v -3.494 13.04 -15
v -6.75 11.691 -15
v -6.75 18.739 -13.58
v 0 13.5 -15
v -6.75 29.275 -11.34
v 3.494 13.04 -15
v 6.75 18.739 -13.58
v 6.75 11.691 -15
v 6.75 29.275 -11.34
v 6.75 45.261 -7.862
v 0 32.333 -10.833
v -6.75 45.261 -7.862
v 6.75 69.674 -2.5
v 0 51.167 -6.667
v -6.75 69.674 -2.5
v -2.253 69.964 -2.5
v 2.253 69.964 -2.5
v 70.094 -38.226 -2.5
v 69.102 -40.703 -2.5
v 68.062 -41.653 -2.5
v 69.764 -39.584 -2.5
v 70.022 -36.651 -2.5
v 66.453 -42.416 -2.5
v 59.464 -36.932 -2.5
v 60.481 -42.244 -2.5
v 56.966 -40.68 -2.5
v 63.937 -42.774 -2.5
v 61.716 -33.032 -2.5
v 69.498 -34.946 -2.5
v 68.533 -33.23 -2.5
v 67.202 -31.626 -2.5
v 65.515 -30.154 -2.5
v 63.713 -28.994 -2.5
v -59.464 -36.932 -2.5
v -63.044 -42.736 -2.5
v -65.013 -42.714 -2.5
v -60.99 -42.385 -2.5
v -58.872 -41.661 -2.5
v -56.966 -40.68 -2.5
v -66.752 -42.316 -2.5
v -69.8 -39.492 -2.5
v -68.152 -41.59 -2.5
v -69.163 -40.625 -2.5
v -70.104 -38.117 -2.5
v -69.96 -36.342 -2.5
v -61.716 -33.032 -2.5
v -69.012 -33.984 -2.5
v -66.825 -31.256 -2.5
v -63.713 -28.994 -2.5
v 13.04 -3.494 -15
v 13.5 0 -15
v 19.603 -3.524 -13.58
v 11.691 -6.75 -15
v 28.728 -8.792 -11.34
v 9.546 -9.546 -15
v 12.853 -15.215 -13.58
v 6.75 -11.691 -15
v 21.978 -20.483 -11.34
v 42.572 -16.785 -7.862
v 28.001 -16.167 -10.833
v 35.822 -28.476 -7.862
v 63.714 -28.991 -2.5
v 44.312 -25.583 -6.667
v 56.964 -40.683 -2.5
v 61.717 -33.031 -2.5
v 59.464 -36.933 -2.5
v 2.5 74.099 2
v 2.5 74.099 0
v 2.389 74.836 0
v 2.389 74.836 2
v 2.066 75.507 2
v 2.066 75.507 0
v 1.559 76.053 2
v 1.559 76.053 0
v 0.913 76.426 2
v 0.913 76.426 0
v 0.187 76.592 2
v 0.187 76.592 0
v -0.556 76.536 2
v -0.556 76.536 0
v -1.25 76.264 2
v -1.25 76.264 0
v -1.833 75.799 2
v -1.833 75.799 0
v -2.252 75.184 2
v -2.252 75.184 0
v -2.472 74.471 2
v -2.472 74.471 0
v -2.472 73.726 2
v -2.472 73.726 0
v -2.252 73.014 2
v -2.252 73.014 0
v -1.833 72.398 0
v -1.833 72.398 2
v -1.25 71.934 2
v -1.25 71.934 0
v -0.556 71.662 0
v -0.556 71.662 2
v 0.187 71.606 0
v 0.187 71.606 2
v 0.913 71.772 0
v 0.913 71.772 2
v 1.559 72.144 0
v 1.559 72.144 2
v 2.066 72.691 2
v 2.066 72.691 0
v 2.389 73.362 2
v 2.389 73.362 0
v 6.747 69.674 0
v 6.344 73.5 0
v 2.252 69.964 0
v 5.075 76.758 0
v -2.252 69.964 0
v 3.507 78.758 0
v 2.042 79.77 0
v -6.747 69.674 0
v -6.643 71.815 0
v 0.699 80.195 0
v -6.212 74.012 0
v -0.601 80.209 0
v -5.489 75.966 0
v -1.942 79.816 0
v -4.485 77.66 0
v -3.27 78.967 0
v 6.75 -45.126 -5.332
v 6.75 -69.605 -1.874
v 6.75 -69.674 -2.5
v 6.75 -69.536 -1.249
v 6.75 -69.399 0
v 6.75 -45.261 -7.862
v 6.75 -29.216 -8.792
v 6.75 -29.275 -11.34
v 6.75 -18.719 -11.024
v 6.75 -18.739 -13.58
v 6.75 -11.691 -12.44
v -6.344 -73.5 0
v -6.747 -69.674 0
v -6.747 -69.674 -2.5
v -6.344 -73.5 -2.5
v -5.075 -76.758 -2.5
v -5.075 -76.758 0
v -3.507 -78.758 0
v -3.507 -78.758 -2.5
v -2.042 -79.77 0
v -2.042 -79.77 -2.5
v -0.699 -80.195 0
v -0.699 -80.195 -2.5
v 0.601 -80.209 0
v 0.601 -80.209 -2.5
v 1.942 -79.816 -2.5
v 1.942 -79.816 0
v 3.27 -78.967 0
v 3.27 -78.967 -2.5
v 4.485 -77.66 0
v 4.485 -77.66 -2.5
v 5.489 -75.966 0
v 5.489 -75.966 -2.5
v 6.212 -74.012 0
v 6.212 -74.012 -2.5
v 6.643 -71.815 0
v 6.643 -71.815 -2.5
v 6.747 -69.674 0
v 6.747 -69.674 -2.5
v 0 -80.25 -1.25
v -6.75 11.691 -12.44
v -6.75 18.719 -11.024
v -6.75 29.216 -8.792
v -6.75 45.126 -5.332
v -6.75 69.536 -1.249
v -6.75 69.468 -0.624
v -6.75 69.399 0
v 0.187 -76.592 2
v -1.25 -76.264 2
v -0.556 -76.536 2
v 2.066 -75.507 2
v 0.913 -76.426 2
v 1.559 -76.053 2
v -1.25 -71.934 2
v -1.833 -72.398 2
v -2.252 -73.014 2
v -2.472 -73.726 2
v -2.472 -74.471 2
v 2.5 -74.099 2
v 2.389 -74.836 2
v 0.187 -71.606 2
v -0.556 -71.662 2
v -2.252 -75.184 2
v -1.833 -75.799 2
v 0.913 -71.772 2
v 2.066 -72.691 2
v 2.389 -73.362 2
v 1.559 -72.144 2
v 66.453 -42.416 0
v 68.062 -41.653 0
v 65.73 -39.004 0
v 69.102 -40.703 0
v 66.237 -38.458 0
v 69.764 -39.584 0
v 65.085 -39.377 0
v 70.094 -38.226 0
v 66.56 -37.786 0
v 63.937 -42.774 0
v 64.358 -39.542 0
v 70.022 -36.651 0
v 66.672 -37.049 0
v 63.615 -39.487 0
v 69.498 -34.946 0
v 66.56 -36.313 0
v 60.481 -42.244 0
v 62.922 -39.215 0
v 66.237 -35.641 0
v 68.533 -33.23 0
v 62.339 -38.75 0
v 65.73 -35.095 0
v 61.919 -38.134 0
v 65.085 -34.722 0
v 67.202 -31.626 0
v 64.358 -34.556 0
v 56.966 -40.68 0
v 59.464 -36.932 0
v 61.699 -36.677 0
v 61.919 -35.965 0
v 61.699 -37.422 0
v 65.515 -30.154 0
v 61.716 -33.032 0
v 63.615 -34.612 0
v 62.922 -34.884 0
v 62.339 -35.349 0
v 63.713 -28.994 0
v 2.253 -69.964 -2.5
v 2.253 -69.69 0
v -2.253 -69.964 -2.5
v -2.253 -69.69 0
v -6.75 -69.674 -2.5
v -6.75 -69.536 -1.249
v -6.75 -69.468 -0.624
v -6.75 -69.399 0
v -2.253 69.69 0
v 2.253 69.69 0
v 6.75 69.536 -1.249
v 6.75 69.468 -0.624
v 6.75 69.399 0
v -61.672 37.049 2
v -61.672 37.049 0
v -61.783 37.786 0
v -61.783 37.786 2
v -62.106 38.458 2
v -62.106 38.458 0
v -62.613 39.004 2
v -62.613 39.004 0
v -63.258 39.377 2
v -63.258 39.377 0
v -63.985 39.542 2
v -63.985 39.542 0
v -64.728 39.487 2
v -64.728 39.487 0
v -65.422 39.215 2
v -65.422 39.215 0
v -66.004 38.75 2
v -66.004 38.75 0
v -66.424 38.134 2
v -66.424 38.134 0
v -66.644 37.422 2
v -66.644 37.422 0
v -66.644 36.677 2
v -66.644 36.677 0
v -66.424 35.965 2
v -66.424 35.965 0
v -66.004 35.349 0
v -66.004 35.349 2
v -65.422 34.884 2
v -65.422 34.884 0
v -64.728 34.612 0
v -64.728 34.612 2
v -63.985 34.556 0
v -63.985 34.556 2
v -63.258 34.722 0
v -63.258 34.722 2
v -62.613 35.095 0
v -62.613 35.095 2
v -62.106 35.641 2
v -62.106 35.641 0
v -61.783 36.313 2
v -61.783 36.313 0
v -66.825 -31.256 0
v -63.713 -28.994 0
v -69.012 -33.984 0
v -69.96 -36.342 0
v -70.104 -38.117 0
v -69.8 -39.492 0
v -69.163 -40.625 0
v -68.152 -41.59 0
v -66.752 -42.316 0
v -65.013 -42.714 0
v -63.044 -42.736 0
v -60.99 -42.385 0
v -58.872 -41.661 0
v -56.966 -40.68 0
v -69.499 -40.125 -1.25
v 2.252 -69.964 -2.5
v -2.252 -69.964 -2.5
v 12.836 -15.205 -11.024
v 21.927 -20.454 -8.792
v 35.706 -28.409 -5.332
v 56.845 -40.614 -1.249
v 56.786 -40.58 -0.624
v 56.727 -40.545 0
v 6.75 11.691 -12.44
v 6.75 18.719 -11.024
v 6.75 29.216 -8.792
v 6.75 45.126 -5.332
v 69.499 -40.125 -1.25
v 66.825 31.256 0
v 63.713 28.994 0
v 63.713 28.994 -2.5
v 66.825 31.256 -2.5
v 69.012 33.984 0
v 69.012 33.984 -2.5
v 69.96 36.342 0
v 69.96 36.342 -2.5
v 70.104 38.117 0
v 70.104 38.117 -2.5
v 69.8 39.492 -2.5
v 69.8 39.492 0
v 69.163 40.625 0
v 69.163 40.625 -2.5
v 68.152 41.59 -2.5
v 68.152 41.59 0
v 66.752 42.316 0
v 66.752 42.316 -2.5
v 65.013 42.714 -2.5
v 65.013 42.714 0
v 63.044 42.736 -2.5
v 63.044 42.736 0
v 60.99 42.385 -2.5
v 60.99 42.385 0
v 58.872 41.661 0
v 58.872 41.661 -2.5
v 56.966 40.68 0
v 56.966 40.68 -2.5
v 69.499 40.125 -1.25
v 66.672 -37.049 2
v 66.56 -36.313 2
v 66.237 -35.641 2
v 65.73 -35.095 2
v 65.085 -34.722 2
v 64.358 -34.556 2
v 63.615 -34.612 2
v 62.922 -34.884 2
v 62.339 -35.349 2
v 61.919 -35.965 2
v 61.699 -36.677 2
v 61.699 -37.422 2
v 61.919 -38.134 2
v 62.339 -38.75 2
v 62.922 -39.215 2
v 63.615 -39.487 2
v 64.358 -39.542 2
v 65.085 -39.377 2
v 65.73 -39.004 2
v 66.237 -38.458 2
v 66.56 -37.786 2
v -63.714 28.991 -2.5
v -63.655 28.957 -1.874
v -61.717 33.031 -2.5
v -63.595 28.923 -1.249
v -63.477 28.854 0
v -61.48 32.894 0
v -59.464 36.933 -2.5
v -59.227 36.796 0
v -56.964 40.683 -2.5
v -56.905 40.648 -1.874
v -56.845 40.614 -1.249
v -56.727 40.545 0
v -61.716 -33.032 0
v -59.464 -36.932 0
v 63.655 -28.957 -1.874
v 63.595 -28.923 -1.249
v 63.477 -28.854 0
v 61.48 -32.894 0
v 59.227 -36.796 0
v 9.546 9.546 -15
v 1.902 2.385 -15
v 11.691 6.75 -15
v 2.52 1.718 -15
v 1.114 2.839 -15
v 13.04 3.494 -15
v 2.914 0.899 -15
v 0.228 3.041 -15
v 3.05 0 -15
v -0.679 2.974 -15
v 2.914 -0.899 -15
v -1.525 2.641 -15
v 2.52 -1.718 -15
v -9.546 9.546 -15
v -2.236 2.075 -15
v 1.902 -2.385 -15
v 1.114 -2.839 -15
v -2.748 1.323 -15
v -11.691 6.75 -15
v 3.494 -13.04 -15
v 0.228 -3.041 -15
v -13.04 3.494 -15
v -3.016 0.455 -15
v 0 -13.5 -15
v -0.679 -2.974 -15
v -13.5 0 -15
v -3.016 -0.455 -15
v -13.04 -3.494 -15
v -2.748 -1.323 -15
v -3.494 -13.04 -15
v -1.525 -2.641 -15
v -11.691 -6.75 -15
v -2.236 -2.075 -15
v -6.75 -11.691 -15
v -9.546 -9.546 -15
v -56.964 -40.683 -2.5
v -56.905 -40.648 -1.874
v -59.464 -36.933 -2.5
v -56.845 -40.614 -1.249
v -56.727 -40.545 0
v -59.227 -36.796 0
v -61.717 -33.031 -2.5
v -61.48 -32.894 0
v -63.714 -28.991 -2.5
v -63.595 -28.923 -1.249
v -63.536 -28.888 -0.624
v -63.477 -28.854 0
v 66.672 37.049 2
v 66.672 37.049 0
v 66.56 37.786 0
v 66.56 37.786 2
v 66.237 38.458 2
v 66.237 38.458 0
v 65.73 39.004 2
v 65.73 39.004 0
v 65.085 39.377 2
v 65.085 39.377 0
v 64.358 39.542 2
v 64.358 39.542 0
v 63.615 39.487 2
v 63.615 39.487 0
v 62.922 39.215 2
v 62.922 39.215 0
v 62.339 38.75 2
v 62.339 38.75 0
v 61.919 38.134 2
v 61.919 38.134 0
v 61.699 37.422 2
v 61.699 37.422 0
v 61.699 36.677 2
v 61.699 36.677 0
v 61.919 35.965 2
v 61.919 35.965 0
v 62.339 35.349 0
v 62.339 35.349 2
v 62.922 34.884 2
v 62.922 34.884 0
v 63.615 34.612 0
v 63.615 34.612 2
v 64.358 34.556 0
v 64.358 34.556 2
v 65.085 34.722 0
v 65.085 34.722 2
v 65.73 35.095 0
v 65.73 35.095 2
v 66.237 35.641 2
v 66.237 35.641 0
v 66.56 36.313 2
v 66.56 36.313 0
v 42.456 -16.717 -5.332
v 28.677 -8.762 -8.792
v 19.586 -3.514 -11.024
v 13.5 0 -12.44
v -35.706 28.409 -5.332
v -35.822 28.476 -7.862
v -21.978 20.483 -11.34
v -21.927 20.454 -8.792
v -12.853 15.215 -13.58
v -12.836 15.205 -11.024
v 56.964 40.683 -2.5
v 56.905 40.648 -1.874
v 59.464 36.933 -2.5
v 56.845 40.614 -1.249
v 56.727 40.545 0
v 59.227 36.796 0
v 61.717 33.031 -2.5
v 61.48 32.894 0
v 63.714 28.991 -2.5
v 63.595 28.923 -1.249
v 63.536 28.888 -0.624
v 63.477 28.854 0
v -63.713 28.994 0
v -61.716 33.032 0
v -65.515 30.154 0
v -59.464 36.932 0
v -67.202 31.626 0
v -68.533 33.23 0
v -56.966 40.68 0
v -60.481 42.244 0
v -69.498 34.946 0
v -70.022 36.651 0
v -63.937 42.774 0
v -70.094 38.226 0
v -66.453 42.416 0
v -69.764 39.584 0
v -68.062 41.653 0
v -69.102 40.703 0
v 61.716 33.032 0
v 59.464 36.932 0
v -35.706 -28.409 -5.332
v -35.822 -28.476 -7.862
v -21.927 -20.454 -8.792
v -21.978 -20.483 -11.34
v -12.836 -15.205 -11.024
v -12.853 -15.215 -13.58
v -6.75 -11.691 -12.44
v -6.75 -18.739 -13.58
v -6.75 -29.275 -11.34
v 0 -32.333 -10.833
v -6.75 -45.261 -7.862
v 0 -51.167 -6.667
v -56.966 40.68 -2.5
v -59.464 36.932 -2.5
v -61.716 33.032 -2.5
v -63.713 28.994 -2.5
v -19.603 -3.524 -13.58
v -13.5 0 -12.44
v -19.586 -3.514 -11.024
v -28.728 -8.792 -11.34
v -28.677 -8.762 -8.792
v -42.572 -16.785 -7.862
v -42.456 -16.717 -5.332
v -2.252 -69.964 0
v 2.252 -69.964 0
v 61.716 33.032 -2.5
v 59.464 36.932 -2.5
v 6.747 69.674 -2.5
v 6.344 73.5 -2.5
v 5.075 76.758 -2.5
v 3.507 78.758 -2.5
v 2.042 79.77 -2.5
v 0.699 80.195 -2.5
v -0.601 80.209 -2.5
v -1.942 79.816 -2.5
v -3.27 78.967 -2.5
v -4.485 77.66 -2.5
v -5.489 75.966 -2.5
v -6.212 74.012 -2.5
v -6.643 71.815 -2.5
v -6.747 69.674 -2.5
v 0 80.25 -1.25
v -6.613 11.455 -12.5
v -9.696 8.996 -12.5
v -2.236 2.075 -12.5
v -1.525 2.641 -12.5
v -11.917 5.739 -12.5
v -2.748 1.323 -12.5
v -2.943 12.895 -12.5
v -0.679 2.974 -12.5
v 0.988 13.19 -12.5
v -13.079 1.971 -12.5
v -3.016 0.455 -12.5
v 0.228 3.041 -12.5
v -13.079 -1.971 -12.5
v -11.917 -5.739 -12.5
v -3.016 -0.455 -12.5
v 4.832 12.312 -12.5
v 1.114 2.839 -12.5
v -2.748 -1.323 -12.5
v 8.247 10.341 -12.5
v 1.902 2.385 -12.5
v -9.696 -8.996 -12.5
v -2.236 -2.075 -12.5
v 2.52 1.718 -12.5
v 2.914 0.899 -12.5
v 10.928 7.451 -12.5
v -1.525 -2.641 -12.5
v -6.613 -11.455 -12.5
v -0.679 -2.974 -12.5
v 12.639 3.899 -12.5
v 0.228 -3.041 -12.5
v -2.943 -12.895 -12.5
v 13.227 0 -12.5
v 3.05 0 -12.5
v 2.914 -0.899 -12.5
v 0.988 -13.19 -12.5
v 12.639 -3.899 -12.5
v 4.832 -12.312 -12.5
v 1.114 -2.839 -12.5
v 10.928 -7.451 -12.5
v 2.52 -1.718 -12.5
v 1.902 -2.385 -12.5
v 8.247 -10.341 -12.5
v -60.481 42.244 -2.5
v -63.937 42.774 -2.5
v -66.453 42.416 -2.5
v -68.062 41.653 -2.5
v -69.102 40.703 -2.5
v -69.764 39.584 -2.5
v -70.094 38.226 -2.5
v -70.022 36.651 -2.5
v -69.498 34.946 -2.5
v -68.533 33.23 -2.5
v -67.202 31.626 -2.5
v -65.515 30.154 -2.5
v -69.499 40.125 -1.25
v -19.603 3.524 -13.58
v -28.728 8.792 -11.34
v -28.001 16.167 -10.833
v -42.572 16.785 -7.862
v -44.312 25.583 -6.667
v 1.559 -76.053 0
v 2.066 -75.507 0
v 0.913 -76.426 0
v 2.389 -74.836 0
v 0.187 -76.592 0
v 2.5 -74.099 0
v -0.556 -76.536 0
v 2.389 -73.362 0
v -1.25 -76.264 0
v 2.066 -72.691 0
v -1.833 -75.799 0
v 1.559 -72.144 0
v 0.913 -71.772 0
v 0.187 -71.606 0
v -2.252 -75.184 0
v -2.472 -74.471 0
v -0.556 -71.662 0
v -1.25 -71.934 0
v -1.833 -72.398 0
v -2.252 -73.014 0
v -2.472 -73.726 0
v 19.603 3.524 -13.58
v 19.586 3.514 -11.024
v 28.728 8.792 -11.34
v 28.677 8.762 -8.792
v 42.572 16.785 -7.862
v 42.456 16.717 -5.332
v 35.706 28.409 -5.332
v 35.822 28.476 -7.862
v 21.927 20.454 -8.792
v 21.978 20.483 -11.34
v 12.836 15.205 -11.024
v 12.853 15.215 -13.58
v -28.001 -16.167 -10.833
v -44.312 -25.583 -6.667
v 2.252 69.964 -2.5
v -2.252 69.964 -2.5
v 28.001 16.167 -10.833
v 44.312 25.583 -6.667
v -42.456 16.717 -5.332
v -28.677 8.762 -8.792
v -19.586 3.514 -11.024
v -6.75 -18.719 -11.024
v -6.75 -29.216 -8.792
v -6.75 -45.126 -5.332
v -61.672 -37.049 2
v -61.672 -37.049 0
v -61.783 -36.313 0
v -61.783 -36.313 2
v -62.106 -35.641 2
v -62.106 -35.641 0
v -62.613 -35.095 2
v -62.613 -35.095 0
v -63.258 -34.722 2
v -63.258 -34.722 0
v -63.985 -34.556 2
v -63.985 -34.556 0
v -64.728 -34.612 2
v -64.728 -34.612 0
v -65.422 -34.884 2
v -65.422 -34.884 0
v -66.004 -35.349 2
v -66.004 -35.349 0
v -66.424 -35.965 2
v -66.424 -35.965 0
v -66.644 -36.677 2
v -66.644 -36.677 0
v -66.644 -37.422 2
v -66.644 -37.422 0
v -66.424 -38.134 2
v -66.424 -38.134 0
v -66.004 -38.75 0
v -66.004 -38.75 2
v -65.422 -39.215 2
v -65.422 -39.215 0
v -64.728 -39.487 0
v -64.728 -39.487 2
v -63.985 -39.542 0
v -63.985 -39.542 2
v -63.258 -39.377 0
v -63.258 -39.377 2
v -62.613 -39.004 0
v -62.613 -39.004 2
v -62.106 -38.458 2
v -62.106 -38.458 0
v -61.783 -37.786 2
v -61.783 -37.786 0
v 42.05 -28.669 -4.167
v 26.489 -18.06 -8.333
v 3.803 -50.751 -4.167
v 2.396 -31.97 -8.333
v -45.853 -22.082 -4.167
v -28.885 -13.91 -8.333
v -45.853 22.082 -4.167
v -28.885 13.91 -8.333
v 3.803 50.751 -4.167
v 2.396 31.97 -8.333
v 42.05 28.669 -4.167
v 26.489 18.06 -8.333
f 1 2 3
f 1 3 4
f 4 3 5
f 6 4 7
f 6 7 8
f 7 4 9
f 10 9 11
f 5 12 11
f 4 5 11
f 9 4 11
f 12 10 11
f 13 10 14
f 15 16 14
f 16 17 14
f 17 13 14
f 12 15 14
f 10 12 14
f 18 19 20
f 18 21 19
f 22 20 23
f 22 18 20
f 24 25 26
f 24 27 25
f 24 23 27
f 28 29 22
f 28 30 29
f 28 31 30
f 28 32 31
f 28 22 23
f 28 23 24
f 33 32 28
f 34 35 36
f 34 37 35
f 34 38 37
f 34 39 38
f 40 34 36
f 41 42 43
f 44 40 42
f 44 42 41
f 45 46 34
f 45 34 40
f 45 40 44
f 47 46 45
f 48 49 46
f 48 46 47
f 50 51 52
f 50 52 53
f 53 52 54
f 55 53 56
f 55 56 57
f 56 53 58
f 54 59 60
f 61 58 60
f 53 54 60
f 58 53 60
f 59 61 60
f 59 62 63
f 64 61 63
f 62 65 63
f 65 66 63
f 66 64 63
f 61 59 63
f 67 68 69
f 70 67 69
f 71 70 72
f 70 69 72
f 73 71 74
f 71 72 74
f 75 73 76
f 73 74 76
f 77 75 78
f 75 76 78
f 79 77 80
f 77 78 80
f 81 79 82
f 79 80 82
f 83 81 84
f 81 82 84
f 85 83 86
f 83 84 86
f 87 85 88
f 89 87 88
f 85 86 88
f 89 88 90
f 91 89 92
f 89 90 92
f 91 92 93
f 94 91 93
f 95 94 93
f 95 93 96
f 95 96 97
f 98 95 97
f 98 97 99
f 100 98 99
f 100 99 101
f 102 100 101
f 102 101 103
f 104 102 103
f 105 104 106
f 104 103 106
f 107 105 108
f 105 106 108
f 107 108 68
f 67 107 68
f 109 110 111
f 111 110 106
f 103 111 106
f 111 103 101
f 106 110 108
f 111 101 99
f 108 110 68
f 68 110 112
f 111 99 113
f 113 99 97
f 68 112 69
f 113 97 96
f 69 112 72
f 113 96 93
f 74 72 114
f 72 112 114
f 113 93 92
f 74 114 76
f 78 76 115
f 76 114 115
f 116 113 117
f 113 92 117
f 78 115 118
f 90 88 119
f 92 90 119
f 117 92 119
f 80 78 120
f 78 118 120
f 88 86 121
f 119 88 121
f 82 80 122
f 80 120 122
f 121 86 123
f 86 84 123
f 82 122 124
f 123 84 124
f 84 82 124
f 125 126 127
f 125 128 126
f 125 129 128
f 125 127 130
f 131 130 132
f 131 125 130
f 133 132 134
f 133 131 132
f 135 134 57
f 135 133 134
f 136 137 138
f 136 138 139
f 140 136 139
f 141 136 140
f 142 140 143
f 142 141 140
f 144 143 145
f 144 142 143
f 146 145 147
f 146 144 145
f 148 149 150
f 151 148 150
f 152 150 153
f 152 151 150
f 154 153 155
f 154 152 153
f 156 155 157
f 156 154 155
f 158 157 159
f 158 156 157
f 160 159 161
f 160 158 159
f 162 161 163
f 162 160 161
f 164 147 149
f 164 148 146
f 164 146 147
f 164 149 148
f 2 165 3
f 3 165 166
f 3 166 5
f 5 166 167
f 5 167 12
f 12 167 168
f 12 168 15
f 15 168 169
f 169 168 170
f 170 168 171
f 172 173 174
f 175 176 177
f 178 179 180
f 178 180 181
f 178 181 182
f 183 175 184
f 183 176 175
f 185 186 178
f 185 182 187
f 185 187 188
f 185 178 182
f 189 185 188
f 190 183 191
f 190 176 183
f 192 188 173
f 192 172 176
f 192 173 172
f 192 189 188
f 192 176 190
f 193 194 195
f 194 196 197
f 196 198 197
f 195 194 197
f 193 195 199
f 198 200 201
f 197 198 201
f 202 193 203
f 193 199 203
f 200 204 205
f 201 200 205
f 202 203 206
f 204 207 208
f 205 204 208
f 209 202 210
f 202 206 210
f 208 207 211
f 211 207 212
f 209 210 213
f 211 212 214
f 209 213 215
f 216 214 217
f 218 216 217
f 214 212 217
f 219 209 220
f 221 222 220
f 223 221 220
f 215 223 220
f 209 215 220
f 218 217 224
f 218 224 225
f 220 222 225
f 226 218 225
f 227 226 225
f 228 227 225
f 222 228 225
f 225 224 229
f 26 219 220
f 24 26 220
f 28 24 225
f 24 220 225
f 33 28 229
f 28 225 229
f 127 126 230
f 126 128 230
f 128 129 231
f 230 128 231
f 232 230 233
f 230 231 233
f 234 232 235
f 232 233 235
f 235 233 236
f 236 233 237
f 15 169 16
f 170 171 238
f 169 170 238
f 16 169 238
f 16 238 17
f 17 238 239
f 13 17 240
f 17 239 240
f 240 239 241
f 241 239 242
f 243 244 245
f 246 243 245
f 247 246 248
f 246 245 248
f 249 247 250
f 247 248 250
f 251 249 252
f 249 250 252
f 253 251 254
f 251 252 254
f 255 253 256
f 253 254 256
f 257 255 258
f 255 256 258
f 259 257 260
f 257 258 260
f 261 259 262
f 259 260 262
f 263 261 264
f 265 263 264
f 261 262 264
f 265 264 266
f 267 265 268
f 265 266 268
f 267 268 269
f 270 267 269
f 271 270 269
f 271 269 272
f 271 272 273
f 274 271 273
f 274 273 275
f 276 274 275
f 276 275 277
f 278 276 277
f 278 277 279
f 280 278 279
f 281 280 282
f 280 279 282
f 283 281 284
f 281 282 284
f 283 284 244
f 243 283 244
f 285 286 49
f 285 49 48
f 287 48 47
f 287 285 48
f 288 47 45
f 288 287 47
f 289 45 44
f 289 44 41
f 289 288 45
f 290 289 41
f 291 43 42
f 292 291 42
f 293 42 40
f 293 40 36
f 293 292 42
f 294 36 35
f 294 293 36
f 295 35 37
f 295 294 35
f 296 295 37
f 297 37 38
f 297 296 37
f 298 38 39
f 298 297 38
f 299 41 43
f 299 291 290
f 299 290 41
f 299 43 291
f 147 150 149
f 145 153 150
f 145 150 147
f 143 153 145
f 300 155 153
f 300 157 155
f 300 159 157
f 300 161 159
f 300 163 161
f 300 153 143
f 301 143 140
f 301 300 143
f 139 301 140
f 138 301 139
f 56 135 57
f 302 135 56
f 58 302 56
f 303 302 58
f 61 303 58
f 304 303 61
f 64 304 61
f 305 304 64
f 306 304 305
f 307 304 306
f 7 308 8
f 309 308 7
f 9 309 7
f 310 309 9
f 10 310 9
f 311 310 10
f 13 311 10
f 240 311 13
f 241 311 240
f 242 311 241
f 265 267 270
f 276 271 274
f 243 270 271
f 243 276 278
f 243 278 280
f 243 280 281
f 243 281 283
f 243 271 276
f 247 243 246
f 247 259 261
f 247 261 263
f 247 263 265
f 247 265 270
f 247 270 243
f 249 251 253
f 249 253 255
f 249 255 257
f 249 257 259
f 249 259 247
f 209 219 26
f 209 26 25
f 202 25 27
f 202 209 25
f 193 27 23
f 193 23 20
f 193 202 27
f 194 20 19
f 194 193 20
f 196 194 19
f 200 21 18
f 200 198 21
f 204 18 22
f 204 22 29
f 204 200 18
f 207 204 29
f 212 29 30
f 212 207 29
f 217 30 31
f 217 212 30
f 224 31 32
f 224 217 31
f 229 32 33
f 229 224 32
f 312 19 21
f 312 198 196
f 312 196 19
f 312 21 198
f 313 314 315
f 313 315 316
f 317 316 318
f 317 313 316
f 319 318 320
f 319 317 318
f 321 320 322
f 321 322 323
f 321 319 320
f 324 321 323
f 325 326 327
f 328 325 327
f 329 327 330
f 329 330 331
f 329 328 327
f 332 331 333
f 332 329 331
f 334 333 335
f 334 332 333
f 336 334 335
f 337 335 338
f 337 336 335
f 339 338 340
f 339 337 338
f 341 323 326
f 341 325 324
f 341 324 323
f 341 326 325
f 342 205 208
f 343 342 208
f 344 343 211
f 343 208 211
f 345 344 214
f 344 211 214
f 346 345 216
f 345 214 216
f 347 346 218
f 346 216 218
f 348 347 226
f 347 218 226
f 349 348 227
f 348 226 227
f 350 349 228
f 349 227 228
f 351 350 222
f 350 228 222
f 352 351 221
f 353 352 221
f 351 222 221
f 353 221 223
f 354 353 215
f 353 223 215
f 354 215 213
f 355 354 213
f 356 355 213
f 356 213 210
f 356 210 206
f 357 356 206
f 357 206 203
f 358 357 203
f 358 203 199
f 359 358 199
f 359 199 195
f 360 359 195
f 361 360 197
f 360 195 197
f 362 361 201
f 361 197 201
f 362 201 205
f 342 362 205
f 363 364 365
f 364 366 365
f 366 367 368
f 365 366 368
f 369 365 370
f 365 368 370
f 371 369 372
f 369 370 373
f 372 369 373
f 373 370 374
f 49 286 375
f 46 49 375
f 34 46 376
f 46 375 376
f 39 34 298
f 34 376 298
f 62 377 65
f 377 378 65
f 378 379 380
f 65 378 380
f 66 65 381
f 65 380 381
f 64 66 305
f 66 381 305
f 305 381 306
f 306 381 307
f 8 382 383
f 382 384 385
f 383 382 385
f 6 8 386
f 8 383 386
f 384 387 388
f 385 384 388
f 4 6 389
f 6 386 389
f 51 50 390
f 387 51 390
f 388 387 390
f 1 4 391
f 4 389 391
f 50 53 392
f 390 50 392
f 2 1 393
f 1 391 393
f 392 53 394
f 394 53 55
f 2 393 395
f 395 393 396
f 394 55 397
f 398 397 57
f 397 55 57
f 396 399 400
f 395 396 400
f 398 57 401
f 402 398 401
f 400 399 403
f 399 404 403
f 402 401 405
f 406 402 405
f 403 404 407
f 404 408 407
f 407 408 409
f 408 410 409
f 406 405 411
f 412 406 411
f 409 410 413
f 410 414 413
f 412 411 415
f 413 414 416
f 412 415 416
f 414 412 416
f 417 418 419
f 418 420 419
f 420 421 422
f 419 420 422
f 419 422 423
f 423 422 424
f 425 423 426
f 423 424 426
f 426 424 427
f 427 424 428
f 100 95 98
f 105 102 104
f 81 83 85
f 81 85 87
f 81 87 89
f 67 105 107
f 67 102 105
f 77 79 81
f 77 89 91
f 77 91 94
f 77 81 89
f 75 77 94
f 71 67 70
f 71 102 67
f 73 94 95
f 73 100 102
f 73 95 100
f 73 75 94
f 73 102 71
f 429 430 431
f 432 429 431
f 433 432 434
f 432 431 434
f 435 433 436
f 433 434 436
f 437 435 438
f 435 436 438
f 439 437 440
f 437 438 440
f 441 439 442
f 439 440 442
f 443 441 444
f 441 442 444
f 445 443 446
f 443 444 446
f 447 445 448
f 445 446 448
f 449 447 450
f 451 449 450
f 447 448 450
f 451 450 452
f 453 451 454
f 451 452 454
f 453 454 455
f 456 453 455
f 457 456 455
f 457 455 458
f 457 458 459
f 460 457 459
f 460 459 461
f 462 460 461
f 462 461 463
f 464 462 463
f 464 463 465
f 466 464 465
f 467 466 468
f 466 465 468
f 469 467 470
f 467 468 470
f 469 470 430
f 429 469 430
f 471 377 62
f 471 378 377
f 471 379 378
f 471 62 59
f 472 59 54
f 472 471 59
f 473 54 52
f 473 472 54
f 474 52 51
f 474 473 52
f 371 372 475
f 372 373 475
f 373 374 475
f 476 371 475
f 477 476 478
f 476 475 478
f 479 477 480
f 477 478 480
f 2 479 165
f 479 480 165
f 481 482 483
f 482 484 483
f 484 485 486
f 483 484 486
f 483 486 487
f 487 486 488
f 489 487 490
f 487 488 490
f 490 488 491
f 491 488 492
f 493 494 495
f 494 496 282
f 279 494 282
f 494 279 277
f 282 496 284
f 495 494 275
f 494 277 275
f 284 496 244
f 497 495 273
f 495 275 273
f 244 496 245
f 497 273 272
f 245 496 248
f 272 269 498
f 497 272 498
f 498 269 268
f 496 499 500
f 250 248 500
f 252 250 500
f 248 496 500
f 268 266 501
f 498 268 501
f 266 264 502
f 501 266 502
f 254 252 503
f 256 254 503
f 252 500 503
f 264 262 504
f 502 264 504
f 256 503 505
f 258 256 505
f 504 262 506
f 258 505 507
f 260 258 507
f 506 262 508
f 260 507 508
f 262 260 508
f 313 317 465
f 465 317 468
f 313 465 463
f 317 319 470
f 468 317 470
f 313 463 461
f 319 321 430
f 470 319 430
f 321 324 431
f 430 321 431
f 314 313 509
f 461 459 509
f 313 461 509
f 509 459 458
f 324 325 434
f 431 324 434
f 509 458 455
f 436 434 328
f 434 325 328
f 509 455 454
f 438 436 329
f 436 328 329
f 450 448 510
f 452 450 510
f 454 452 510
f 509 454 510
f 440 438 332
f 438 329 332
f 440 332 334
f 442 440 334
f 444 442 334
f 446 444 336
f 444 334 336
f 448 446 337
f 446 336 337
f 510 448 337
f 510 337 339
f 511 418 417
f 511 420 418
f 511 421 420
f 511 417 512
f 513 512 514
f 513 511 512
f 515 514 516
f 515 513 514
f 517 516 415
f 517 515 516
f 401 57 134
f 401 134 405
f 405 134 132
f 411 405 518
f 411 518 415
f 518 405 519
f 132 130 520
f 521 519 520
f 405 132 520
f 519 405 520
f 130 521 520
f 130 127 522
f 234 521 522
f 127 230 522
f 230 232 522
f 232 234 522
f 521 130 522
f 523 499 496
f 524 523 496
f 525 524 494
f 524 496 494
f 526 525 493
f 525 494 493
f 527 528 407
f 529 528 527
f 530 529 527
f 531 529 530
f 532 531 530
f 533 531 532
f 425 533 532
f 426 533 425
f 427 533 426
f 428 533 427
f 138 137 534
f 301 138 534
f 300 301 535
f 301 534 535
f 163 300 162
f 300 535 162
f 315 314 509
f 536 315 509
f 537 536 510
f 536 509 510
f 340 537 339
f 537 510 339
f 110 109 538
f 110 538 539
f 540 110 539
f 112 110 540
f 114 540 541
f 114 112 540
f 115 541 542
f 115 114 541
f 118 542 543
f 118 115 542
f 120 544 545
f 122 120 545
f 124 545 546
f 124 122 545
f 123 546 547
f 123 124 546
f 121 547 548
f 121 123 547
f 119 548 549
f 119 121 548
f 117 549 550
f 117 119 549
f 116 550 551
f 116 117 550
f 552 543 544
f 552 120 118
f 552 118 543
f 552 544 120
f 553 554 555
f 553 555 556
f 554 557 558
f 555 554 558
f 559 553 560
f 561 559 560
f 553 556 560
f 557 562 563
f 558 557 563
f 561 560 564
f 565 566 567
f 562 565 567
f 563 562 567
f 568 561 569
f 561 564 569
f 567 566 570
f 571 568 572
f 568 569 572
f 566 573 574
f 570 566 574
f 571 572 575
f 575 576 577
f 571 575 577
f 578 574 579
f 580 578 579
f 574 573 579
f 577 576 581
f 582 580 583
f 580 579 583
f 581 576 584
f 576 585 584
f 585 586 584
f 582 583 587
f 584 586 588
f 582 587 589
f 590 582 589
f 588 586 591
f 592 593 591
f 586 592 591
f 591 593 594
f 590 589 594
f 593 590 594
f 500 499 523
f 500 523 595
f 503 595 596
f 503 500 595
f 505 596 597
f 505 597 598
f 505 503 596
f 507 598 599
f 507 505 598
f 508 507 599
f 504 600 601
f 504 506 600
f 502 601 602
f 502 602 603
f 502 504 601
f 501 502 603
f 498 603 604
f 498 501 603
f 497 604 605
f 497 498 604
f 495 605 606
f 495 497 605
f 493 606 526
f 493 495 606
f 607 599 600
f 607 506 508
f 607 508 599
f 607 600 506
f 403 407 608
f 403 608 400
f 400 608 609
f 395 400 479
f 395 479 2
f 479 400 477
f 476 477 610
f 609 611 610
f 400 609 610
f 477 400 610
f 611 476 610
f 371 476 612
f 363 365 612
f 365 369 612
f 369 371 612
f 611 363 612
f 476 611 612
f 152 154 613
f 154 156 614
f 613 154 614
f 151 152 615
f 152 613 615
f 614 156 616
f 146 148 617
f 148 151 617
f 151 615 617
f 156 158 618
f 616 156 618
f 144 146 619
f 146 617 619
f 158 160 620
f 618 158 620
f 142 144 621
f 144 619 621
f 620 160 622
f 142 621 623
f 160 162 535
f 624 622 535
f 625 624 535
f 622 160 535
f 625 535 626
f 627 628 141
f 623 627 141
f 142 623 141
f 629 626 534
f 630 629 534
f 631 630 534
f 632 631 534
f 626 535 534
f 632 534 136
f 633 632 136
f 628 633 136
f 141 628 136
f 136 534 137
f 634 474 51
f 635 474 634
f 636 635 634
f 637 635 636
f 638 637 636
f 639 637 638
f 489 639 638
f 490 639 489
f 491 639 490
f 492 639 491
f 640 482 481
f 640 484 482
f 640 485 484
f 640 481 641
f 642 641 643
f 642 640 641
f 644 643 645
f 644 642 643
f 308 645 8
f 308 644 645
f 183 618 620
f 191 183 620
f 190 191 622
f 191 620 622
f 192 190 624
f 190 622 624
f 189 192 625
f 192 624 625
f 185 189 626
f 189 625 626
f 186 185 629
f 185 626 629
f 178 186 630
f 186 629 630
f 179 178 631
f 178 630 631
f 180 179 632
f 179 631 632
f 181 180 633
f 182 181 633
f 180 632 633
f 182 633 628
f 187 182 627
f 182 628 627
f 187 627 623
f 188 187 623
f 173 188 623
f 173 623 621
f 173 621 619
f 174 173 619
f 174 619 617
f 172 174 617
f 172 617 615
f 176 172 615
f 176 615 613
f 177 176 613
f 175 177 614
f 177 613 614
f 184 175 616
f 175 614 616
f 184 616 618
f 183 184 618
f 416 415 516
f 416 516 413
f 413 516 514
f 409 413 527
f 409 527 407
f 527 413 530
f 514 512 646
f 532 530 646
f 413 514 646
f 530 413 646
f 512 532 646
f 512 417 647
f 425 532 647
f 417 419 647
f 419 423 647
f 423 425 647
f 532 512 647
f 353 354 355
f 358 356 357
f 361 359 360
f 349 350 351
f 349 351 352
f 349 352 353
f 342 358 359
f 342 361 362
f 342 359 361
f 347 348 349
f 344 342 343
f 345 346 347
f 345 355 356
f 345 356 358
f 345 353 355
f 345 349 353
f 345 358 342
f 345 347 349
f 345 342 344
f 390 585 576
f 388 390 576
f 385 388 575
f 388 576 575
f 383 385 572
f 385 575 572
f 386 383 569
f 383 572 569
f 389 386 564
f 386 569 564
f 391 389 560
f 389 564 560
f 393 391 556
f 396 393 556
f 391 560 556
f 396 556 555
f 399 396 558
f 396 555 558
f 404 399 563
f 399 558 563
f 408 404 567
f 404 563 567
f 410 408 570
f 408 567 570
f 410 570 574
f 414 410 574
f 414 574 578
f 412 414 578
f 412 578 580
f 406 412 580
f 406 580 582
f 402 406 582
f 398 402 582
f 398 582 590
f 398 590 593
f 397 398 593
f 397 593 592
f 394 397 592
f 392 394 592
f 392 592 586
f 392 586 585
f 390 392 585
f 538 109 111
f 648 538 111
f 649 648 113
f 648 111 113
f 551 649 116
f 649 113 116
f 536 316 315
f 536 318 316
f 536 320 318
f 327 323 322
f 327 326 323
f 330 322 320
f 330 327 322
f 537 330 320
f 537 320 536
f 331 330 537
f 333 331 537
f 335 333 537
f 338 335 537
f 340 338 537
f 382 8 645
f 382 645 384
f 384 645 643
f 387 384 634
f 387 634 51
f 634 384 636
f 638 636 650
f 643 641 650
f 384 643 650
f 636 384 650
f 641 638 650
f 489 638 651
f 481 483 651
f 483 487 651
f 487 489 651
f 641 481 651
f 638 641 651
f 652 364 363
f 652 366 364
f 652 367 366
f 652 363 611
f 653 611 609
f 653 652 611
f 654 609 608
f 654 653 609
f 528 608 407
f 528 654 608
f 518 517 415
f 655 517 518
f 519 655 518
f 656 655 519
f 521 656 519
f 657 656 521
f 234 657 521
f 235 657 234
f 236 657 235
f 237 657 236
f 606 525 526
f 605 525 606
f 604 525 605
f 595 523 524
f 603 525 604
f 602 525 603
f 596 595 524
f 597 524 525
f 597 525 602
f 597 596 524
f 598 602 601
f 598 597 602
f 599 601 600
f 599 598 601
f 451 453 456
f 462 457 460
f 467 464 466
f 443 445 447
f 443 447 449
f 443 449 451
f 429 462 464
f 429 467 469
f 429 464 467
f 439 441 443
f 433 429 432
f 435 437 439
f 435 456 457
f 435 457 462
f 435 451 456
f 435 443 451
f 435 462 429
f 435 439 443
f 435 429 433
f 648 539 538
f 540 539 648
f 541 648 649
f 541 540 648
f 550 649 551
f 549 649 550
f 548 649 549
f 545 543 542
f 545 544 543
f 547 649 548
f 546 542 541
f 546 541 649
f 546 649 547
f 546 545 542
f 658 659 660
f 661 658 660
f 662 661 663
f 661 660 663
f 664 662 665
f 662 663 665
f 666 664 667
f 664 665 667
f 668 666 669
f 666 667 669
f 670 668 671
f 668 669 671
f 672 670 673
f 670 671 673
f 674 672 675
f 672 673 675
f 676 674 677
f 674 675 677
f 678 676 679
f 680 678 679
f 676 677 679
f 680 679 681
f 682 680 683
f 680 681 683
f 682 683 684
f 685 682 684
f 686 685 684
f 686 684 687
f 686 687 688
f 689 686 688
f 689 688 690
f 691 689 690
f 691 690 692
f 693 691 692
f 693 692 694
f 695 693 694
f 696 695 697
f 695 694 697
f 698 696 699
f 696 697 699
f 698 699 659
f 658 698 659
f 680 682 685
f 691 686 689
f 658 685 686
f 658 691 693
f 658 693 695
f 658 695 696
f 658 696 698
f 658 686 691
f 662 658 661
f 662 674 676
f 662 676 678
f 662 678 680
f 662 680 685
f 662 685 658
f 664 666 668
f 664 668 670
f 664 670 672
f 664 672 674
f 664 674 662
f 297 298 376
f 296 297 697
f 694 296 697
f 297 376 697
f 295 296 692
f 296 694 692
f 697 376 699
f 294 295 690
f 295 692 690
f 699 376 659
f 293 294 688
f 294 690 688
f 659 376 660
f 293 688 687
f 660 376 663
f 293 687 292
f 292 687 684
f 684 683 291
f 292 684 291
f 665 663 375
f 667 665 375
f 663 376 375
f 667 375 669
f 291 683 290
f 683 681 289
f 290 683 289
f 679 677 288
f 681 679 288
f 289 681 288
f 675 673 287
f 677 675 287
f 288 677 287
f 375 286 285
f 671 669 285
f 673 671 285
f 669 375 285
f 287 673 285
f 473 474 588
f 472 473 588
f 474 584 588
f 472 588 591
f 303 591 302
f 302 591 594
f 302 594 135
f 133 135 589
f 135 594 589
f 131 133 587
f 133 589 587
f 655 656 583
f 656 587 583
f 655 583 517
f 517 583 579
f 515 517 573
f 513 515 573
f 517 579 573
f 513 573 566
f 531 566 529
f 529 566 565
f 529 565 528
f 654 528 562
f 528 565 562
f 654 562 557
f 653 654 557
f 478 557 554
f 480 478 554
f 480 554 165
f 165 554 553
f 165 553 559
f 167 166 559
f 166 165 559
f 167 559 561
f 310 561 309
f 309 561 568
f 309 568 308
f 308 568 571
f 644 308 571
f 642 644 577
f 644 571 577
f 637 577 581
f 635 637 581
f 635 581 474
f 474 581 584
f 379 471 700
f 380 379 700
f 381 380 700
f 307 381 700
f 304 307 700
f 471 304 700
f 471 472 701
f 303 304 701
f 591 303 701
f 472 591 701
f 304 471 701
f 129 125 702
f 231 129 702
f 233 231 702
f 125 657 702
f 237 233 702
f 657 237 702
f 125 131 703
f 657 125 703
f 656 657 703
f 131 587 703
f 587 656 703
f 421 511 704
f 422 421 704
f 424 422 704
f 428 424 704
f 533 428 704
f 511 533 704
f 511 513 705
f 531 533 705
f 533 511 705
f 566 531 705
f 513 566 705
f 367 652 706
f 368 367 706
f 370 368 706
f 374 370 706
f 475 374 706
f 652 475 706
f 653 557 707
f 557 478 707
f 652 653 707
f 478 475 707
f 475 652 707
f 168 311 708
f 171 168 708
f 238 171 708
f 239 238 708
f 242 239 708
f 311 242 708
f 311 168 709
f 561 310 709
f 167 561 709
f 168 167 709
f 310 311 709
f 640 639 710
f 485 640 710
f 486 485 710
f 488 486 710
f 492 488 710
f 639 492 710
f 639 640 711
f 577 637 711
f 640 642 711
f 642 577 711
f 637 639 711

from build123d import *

# Parameters (mm, degrees)
F_6_1_6_1_DIAMETER_HOLE1_D = 6.1
CUT_EXTRUDE6_DEPTH         = 16
BOSS_EXTRUDE1_DEPTH        = 2.5
BOSS_EXTRUDE1_2_DEPTH      = 2.5
BOSS_EXTRUDE1_3_DEPTH      = 2.5
BOSS_EXTRUDE1_4_DEPTH      = 2.5
BOSS_EXTRUDE1_5_DEPTH      = 2.5
BOSS_EXTRUDE1_6_DEPTH      = 2.5
SKETCH8_R                  = 2.5
BOSS_EXTRUDE2_DEPTH        = 2


with BuildPart() as part:
    # Sketch1 → Revolve1 (revolve)
    with BuildSketch(Plane(origin=(0, 0, 0), x_dir=(1, 0, 0), z_dir=(0, 1, 0))):
        Polygon((0, 15), (13.5, 15), (70, 2.5), (69.726754993, 0), (13.226754993, 12.5), (0, 12.5), align=None)
    revolve(axis=Axis((0, 0, -12.5), (0, 0, -1)))

    # Ø6.1 (6.1) Diameter Hole1 (through all)
    with Locations(Plane(origin=(0, 0, -15), x_dir=(-1, 0, 0), z_dir=(0, 0, -1))):
        with Locations((0, 0)):
            Hole(F_6_1_6_1_DIAMETER_HOLE1_D / 2)

    # Sketch6 → Cut-Extrude6 (cut, through all)
    with BuildSketch(Plane.XY):
        with BuildLine():
            Line((6.75, 11.691342951), (6.75, 69.673793495))
            ThreePointArc((6.75, 69.673793495), (35, 60.621778265), (56.964275145, 40.682568223))
            Line((56.964275145, 40.682568223), (6.75, 11.691342951))
        make_face()
        with BuildLine():
            Line((13.5, 0), (63.714275145, 28.991225272))
            ThreePointArc((63.714275145, 28.991225272), (69.046745107, 11.512905374), (69.673793495, -6.75))
            ThreePointArc((69.673793495, -6.75), (67.61480784, -18.117333157), (63.714275145, -28.991225272))
            Line((63.714275145, -28.991225272), (13.5, 0))
        make_face()
        with BuildLine():
            Line((-6.75, 11.691342951), (-6.75, 69.673793495))
            ThreePointArc((-6.75, 69.673793495), (-35, 60.621778265), (-56.964275145, 40.682568223))
            Line((-56.964275145, 40.682568223), (-6.75, 11.691342951))
        make_face()
        with BuildLine():
            Line((6.75, -11.691342951), (56.964275145, -40.682568223))
            ThreePointArc((56.964275145, -40.682568223), (35, -60.621778265), (6.75, -69.673793495))
            Line((6.75, -69.673793495), (6.75, -11.691342951))
        make_face()
        with BuildLine():
            Line((-6.75, -11.691342951), (-6.75, -69.673793495))
            ThreePointArc((-6.75, -69.673793495), (-35, -60.621778265), (-56.964275145, -40.682568223))
            Line((-56.964275145, -40.682568223), (-6.75, -11.691342951))
        make_face()
        with BuildLine():
            Line((-13.5, 0), (-63.714275145, -28.991225272))
            ThreePointArc((-63.714275145, -28.991225272), (-67.61480784, -18.117333157), (-69.673793495, -6.75))
            ThreePointArc((-69.673793495, -6.75), (-69.046745107, 11.512905374), (-63.714275145, 28.991225272))
            Line((-63.714275145, 28.991225272), (-13.5, 0))
        make_face()
    extrude(amount=-CUT_EXTRUDE6_DEPTH, mode=Mode.SUBTRACT)


with BuildPart() as body_2:
    # Sketch7 → Boss-Extrude1 (new body)
    with BuildSketch(Plane.XY):
        with BuildLine():
            ThreePointArc((6.746587752, 69.67412399), (0, 70), (-6.746587752, 69.67412399))
            add(Edge.make_bspline(
                [(6.746587752, 69.67412399), (6.968123789, 80.25), (0, 80.25), (-6.968123789, 80.25), (-6.746587752, 69.67412399)],
                knots=[1.538998187, 1.538998187, 1.538998187, 3.141592654, 3.141592654, 4.74418712, 4.74418712, 4.74418712], degree=2, weights=[1, 0.695775545, 1, 0.695775545, 1]))
        make_face()
    extrude(amount=-BOSS_EXTRUDE1_DEPTH)



with BuildPart() as body_3:
    # Sketch7 → Boss-Extrude1 2 (new body)
    with BuildSketch(Plane.XY):
        with BuildLine():
            ThreePointArc((63.712855237, 28.994345613), (60.621778265, 35), (56.966267485, 40.679778377))
            add(Edge.make_bspline(
                [(63.712855237, 28.994345613), (72.982600548, 34.090427782), (69.498538654, 40.125), (66.014476759, 46.159572218), (56.966267485, 40.679778377)],
                knots=[1.538998187, 1.538998187, 1.538998187, 3.141592654, 3.141592654, 4.74418712, 4.74418712, 4.74418712], degree=2, weights=[1, 0.695775545, 1, 0.695775545, 1]))
        make_face()
    extrude(amount=-BOSS_EXTRUDE1_2_DEPTH)


with BuildPart() as body_4:
    # Sketch7 → Boss-Extrude1 3 (new body)
    with BuildSketch(Plane.XY):
        with BuildLine():
            ThreePointArc((56.966267485, -40.679778377), (60.621778265, -35), (63.712855237, -28.994345613))
            add(Edge.make_bspline(
                [(56.966267485, -40.679778377), (66.014476759, -46.159572218), (69.498538654, -40.125), (72.982600548, -34.090427782), (63.712855237, -28.994345613)],
                knots=[1.538998187, 1.538998187, 1.538998187, 3.141592654, 3.141592654, 4.74418712, 4.74418712, 4.74418712], degree=2, weights=[1, 0.695775545, 1, 0.695775545, 1]))
        make_face()
    extrude(amount=-BOSS_EXTRUDE1_3_DEPTH)


with BuildPart() as body_5:
    # Sketch7 → Boss-Extrude1 4 (new body)
    with BuildSketch(Plane.XY):
        with BuildLine():
            ThreePointArc((-6.746587752, -69.67412399), (0, -70), (6.746587752, -69.67412399))
            add(Edge.make_bspline(
                [(-6.746587752, -69.67412399), (-6.968123789, -80.25), (0, -80.25), (6.968123789, -80.25), (6.746587752, -69.67412399)],
                knots=[1.538998187, 1.538998187, 1.538998187, 3.141592654, 3.141592654, 4.74418712, 4.74418712, 4.74418712], degree=2, weights=[1, 0.695775545, 1, 0.695775545, 1]))
        make_face()
    extrude(amount=-BOSS_EXTRUDE1_4_DEPTH)


with BuildPart() as body_6:
    # Sketch7 → Boss-Extrude1 5 (new body)
    with BuildSketch(Plane.XY):
        with BuildLine():
            ThreePointArc((-63.712855237, -28.994345613), (-60.621778265, -35), (-56.966267485, -40.679778377))
            add(Edge.make_bspline(
                [(-63.712855237, -28.994345613), (-72.982600548, -34.090427782), (-69.498538654, -40.125), (-66.014476759, -46.159572218), (-56.966267485, -40.679778377)],
                knots=[1.538998187, 1.538998187, 1.538998187, 3.141592654, 3.141592654, 4.74418712, 4.74418712, 4.74418712], degree=2, weights=[1, 0.695775545, 1, 0.695775545, 1]))
        make_face()
    extrude(amount=-BOSS_EXTRUDE1_5_DEPTH)


with BuildPart() as body_7:
    # Sketch7 → Boss-Extrude1 6 (new body)
    with BuildSketch(Plane.XY):
        with BuildLine():
            ThreePointArc((-56.966267485, 40.679778377), (-60.621778265, 35), (-63.712855237, 28.994345613))
            add(Edge.make_bspline(
                [(-56.966267485, 40.679778377), (-66.014476759, 46.159572218), (-69.498538654, 40.125), (-72.982600548, 34.090427782), (-63.712855237, 28.994345613)],
                knots=[1.538998187, 1.538998187, 1.538998187, 3.141592654, 3.141592654, 4.74418712, 4.74418712, 4.74418712], degree=2, weights=[1, 0.695775545, 1, 0.695775545, 1]))
        make_face()
    extrude(amount=-BOSS_EXTRUDE1_6_DEPTH)


with BuildPart() as body_2_1:
    add(body_2.part)

    add(body_3.part)  # Boss-Extrude2 merges body 3

    add(body_4.part)  # Boss-Extrude2 merges body 4

    add(body_5.part)  # Boss-Extrude2 merges body 5

    add(body_6.part)  # Boss-Extrude2 merges body 6

    add(body_7.part)  # Boss-Extrude2 merges body 7
    # Sketch8 → Boss-Extrude2 (add)
    with BuildSketch(Plane.XY):
        with Locations((0, 74.0988925)):
            Circle(SKETCH8_R)
        with Locations((64.171523297, 37.04944625)):
            Circle(SKETCH8_R)
        with Locations((64.171523297, -37.04944625)):
            Circle(SKETCH8_R)
        with Locations((0, -74.0988925)):
            Circle(SKETCH8_R)
        with Locations((-64.171523297, -37.04944625)):
            Circle(SKETCH8_R)
        with Locations((-64.171523297, 37.04944625)):
            Circle(SKETCH8_R)
    extrude(amount=BOSS_EXTRUDE2_DEPTH)


solid = Compound([part.part, body_2_1.part])
